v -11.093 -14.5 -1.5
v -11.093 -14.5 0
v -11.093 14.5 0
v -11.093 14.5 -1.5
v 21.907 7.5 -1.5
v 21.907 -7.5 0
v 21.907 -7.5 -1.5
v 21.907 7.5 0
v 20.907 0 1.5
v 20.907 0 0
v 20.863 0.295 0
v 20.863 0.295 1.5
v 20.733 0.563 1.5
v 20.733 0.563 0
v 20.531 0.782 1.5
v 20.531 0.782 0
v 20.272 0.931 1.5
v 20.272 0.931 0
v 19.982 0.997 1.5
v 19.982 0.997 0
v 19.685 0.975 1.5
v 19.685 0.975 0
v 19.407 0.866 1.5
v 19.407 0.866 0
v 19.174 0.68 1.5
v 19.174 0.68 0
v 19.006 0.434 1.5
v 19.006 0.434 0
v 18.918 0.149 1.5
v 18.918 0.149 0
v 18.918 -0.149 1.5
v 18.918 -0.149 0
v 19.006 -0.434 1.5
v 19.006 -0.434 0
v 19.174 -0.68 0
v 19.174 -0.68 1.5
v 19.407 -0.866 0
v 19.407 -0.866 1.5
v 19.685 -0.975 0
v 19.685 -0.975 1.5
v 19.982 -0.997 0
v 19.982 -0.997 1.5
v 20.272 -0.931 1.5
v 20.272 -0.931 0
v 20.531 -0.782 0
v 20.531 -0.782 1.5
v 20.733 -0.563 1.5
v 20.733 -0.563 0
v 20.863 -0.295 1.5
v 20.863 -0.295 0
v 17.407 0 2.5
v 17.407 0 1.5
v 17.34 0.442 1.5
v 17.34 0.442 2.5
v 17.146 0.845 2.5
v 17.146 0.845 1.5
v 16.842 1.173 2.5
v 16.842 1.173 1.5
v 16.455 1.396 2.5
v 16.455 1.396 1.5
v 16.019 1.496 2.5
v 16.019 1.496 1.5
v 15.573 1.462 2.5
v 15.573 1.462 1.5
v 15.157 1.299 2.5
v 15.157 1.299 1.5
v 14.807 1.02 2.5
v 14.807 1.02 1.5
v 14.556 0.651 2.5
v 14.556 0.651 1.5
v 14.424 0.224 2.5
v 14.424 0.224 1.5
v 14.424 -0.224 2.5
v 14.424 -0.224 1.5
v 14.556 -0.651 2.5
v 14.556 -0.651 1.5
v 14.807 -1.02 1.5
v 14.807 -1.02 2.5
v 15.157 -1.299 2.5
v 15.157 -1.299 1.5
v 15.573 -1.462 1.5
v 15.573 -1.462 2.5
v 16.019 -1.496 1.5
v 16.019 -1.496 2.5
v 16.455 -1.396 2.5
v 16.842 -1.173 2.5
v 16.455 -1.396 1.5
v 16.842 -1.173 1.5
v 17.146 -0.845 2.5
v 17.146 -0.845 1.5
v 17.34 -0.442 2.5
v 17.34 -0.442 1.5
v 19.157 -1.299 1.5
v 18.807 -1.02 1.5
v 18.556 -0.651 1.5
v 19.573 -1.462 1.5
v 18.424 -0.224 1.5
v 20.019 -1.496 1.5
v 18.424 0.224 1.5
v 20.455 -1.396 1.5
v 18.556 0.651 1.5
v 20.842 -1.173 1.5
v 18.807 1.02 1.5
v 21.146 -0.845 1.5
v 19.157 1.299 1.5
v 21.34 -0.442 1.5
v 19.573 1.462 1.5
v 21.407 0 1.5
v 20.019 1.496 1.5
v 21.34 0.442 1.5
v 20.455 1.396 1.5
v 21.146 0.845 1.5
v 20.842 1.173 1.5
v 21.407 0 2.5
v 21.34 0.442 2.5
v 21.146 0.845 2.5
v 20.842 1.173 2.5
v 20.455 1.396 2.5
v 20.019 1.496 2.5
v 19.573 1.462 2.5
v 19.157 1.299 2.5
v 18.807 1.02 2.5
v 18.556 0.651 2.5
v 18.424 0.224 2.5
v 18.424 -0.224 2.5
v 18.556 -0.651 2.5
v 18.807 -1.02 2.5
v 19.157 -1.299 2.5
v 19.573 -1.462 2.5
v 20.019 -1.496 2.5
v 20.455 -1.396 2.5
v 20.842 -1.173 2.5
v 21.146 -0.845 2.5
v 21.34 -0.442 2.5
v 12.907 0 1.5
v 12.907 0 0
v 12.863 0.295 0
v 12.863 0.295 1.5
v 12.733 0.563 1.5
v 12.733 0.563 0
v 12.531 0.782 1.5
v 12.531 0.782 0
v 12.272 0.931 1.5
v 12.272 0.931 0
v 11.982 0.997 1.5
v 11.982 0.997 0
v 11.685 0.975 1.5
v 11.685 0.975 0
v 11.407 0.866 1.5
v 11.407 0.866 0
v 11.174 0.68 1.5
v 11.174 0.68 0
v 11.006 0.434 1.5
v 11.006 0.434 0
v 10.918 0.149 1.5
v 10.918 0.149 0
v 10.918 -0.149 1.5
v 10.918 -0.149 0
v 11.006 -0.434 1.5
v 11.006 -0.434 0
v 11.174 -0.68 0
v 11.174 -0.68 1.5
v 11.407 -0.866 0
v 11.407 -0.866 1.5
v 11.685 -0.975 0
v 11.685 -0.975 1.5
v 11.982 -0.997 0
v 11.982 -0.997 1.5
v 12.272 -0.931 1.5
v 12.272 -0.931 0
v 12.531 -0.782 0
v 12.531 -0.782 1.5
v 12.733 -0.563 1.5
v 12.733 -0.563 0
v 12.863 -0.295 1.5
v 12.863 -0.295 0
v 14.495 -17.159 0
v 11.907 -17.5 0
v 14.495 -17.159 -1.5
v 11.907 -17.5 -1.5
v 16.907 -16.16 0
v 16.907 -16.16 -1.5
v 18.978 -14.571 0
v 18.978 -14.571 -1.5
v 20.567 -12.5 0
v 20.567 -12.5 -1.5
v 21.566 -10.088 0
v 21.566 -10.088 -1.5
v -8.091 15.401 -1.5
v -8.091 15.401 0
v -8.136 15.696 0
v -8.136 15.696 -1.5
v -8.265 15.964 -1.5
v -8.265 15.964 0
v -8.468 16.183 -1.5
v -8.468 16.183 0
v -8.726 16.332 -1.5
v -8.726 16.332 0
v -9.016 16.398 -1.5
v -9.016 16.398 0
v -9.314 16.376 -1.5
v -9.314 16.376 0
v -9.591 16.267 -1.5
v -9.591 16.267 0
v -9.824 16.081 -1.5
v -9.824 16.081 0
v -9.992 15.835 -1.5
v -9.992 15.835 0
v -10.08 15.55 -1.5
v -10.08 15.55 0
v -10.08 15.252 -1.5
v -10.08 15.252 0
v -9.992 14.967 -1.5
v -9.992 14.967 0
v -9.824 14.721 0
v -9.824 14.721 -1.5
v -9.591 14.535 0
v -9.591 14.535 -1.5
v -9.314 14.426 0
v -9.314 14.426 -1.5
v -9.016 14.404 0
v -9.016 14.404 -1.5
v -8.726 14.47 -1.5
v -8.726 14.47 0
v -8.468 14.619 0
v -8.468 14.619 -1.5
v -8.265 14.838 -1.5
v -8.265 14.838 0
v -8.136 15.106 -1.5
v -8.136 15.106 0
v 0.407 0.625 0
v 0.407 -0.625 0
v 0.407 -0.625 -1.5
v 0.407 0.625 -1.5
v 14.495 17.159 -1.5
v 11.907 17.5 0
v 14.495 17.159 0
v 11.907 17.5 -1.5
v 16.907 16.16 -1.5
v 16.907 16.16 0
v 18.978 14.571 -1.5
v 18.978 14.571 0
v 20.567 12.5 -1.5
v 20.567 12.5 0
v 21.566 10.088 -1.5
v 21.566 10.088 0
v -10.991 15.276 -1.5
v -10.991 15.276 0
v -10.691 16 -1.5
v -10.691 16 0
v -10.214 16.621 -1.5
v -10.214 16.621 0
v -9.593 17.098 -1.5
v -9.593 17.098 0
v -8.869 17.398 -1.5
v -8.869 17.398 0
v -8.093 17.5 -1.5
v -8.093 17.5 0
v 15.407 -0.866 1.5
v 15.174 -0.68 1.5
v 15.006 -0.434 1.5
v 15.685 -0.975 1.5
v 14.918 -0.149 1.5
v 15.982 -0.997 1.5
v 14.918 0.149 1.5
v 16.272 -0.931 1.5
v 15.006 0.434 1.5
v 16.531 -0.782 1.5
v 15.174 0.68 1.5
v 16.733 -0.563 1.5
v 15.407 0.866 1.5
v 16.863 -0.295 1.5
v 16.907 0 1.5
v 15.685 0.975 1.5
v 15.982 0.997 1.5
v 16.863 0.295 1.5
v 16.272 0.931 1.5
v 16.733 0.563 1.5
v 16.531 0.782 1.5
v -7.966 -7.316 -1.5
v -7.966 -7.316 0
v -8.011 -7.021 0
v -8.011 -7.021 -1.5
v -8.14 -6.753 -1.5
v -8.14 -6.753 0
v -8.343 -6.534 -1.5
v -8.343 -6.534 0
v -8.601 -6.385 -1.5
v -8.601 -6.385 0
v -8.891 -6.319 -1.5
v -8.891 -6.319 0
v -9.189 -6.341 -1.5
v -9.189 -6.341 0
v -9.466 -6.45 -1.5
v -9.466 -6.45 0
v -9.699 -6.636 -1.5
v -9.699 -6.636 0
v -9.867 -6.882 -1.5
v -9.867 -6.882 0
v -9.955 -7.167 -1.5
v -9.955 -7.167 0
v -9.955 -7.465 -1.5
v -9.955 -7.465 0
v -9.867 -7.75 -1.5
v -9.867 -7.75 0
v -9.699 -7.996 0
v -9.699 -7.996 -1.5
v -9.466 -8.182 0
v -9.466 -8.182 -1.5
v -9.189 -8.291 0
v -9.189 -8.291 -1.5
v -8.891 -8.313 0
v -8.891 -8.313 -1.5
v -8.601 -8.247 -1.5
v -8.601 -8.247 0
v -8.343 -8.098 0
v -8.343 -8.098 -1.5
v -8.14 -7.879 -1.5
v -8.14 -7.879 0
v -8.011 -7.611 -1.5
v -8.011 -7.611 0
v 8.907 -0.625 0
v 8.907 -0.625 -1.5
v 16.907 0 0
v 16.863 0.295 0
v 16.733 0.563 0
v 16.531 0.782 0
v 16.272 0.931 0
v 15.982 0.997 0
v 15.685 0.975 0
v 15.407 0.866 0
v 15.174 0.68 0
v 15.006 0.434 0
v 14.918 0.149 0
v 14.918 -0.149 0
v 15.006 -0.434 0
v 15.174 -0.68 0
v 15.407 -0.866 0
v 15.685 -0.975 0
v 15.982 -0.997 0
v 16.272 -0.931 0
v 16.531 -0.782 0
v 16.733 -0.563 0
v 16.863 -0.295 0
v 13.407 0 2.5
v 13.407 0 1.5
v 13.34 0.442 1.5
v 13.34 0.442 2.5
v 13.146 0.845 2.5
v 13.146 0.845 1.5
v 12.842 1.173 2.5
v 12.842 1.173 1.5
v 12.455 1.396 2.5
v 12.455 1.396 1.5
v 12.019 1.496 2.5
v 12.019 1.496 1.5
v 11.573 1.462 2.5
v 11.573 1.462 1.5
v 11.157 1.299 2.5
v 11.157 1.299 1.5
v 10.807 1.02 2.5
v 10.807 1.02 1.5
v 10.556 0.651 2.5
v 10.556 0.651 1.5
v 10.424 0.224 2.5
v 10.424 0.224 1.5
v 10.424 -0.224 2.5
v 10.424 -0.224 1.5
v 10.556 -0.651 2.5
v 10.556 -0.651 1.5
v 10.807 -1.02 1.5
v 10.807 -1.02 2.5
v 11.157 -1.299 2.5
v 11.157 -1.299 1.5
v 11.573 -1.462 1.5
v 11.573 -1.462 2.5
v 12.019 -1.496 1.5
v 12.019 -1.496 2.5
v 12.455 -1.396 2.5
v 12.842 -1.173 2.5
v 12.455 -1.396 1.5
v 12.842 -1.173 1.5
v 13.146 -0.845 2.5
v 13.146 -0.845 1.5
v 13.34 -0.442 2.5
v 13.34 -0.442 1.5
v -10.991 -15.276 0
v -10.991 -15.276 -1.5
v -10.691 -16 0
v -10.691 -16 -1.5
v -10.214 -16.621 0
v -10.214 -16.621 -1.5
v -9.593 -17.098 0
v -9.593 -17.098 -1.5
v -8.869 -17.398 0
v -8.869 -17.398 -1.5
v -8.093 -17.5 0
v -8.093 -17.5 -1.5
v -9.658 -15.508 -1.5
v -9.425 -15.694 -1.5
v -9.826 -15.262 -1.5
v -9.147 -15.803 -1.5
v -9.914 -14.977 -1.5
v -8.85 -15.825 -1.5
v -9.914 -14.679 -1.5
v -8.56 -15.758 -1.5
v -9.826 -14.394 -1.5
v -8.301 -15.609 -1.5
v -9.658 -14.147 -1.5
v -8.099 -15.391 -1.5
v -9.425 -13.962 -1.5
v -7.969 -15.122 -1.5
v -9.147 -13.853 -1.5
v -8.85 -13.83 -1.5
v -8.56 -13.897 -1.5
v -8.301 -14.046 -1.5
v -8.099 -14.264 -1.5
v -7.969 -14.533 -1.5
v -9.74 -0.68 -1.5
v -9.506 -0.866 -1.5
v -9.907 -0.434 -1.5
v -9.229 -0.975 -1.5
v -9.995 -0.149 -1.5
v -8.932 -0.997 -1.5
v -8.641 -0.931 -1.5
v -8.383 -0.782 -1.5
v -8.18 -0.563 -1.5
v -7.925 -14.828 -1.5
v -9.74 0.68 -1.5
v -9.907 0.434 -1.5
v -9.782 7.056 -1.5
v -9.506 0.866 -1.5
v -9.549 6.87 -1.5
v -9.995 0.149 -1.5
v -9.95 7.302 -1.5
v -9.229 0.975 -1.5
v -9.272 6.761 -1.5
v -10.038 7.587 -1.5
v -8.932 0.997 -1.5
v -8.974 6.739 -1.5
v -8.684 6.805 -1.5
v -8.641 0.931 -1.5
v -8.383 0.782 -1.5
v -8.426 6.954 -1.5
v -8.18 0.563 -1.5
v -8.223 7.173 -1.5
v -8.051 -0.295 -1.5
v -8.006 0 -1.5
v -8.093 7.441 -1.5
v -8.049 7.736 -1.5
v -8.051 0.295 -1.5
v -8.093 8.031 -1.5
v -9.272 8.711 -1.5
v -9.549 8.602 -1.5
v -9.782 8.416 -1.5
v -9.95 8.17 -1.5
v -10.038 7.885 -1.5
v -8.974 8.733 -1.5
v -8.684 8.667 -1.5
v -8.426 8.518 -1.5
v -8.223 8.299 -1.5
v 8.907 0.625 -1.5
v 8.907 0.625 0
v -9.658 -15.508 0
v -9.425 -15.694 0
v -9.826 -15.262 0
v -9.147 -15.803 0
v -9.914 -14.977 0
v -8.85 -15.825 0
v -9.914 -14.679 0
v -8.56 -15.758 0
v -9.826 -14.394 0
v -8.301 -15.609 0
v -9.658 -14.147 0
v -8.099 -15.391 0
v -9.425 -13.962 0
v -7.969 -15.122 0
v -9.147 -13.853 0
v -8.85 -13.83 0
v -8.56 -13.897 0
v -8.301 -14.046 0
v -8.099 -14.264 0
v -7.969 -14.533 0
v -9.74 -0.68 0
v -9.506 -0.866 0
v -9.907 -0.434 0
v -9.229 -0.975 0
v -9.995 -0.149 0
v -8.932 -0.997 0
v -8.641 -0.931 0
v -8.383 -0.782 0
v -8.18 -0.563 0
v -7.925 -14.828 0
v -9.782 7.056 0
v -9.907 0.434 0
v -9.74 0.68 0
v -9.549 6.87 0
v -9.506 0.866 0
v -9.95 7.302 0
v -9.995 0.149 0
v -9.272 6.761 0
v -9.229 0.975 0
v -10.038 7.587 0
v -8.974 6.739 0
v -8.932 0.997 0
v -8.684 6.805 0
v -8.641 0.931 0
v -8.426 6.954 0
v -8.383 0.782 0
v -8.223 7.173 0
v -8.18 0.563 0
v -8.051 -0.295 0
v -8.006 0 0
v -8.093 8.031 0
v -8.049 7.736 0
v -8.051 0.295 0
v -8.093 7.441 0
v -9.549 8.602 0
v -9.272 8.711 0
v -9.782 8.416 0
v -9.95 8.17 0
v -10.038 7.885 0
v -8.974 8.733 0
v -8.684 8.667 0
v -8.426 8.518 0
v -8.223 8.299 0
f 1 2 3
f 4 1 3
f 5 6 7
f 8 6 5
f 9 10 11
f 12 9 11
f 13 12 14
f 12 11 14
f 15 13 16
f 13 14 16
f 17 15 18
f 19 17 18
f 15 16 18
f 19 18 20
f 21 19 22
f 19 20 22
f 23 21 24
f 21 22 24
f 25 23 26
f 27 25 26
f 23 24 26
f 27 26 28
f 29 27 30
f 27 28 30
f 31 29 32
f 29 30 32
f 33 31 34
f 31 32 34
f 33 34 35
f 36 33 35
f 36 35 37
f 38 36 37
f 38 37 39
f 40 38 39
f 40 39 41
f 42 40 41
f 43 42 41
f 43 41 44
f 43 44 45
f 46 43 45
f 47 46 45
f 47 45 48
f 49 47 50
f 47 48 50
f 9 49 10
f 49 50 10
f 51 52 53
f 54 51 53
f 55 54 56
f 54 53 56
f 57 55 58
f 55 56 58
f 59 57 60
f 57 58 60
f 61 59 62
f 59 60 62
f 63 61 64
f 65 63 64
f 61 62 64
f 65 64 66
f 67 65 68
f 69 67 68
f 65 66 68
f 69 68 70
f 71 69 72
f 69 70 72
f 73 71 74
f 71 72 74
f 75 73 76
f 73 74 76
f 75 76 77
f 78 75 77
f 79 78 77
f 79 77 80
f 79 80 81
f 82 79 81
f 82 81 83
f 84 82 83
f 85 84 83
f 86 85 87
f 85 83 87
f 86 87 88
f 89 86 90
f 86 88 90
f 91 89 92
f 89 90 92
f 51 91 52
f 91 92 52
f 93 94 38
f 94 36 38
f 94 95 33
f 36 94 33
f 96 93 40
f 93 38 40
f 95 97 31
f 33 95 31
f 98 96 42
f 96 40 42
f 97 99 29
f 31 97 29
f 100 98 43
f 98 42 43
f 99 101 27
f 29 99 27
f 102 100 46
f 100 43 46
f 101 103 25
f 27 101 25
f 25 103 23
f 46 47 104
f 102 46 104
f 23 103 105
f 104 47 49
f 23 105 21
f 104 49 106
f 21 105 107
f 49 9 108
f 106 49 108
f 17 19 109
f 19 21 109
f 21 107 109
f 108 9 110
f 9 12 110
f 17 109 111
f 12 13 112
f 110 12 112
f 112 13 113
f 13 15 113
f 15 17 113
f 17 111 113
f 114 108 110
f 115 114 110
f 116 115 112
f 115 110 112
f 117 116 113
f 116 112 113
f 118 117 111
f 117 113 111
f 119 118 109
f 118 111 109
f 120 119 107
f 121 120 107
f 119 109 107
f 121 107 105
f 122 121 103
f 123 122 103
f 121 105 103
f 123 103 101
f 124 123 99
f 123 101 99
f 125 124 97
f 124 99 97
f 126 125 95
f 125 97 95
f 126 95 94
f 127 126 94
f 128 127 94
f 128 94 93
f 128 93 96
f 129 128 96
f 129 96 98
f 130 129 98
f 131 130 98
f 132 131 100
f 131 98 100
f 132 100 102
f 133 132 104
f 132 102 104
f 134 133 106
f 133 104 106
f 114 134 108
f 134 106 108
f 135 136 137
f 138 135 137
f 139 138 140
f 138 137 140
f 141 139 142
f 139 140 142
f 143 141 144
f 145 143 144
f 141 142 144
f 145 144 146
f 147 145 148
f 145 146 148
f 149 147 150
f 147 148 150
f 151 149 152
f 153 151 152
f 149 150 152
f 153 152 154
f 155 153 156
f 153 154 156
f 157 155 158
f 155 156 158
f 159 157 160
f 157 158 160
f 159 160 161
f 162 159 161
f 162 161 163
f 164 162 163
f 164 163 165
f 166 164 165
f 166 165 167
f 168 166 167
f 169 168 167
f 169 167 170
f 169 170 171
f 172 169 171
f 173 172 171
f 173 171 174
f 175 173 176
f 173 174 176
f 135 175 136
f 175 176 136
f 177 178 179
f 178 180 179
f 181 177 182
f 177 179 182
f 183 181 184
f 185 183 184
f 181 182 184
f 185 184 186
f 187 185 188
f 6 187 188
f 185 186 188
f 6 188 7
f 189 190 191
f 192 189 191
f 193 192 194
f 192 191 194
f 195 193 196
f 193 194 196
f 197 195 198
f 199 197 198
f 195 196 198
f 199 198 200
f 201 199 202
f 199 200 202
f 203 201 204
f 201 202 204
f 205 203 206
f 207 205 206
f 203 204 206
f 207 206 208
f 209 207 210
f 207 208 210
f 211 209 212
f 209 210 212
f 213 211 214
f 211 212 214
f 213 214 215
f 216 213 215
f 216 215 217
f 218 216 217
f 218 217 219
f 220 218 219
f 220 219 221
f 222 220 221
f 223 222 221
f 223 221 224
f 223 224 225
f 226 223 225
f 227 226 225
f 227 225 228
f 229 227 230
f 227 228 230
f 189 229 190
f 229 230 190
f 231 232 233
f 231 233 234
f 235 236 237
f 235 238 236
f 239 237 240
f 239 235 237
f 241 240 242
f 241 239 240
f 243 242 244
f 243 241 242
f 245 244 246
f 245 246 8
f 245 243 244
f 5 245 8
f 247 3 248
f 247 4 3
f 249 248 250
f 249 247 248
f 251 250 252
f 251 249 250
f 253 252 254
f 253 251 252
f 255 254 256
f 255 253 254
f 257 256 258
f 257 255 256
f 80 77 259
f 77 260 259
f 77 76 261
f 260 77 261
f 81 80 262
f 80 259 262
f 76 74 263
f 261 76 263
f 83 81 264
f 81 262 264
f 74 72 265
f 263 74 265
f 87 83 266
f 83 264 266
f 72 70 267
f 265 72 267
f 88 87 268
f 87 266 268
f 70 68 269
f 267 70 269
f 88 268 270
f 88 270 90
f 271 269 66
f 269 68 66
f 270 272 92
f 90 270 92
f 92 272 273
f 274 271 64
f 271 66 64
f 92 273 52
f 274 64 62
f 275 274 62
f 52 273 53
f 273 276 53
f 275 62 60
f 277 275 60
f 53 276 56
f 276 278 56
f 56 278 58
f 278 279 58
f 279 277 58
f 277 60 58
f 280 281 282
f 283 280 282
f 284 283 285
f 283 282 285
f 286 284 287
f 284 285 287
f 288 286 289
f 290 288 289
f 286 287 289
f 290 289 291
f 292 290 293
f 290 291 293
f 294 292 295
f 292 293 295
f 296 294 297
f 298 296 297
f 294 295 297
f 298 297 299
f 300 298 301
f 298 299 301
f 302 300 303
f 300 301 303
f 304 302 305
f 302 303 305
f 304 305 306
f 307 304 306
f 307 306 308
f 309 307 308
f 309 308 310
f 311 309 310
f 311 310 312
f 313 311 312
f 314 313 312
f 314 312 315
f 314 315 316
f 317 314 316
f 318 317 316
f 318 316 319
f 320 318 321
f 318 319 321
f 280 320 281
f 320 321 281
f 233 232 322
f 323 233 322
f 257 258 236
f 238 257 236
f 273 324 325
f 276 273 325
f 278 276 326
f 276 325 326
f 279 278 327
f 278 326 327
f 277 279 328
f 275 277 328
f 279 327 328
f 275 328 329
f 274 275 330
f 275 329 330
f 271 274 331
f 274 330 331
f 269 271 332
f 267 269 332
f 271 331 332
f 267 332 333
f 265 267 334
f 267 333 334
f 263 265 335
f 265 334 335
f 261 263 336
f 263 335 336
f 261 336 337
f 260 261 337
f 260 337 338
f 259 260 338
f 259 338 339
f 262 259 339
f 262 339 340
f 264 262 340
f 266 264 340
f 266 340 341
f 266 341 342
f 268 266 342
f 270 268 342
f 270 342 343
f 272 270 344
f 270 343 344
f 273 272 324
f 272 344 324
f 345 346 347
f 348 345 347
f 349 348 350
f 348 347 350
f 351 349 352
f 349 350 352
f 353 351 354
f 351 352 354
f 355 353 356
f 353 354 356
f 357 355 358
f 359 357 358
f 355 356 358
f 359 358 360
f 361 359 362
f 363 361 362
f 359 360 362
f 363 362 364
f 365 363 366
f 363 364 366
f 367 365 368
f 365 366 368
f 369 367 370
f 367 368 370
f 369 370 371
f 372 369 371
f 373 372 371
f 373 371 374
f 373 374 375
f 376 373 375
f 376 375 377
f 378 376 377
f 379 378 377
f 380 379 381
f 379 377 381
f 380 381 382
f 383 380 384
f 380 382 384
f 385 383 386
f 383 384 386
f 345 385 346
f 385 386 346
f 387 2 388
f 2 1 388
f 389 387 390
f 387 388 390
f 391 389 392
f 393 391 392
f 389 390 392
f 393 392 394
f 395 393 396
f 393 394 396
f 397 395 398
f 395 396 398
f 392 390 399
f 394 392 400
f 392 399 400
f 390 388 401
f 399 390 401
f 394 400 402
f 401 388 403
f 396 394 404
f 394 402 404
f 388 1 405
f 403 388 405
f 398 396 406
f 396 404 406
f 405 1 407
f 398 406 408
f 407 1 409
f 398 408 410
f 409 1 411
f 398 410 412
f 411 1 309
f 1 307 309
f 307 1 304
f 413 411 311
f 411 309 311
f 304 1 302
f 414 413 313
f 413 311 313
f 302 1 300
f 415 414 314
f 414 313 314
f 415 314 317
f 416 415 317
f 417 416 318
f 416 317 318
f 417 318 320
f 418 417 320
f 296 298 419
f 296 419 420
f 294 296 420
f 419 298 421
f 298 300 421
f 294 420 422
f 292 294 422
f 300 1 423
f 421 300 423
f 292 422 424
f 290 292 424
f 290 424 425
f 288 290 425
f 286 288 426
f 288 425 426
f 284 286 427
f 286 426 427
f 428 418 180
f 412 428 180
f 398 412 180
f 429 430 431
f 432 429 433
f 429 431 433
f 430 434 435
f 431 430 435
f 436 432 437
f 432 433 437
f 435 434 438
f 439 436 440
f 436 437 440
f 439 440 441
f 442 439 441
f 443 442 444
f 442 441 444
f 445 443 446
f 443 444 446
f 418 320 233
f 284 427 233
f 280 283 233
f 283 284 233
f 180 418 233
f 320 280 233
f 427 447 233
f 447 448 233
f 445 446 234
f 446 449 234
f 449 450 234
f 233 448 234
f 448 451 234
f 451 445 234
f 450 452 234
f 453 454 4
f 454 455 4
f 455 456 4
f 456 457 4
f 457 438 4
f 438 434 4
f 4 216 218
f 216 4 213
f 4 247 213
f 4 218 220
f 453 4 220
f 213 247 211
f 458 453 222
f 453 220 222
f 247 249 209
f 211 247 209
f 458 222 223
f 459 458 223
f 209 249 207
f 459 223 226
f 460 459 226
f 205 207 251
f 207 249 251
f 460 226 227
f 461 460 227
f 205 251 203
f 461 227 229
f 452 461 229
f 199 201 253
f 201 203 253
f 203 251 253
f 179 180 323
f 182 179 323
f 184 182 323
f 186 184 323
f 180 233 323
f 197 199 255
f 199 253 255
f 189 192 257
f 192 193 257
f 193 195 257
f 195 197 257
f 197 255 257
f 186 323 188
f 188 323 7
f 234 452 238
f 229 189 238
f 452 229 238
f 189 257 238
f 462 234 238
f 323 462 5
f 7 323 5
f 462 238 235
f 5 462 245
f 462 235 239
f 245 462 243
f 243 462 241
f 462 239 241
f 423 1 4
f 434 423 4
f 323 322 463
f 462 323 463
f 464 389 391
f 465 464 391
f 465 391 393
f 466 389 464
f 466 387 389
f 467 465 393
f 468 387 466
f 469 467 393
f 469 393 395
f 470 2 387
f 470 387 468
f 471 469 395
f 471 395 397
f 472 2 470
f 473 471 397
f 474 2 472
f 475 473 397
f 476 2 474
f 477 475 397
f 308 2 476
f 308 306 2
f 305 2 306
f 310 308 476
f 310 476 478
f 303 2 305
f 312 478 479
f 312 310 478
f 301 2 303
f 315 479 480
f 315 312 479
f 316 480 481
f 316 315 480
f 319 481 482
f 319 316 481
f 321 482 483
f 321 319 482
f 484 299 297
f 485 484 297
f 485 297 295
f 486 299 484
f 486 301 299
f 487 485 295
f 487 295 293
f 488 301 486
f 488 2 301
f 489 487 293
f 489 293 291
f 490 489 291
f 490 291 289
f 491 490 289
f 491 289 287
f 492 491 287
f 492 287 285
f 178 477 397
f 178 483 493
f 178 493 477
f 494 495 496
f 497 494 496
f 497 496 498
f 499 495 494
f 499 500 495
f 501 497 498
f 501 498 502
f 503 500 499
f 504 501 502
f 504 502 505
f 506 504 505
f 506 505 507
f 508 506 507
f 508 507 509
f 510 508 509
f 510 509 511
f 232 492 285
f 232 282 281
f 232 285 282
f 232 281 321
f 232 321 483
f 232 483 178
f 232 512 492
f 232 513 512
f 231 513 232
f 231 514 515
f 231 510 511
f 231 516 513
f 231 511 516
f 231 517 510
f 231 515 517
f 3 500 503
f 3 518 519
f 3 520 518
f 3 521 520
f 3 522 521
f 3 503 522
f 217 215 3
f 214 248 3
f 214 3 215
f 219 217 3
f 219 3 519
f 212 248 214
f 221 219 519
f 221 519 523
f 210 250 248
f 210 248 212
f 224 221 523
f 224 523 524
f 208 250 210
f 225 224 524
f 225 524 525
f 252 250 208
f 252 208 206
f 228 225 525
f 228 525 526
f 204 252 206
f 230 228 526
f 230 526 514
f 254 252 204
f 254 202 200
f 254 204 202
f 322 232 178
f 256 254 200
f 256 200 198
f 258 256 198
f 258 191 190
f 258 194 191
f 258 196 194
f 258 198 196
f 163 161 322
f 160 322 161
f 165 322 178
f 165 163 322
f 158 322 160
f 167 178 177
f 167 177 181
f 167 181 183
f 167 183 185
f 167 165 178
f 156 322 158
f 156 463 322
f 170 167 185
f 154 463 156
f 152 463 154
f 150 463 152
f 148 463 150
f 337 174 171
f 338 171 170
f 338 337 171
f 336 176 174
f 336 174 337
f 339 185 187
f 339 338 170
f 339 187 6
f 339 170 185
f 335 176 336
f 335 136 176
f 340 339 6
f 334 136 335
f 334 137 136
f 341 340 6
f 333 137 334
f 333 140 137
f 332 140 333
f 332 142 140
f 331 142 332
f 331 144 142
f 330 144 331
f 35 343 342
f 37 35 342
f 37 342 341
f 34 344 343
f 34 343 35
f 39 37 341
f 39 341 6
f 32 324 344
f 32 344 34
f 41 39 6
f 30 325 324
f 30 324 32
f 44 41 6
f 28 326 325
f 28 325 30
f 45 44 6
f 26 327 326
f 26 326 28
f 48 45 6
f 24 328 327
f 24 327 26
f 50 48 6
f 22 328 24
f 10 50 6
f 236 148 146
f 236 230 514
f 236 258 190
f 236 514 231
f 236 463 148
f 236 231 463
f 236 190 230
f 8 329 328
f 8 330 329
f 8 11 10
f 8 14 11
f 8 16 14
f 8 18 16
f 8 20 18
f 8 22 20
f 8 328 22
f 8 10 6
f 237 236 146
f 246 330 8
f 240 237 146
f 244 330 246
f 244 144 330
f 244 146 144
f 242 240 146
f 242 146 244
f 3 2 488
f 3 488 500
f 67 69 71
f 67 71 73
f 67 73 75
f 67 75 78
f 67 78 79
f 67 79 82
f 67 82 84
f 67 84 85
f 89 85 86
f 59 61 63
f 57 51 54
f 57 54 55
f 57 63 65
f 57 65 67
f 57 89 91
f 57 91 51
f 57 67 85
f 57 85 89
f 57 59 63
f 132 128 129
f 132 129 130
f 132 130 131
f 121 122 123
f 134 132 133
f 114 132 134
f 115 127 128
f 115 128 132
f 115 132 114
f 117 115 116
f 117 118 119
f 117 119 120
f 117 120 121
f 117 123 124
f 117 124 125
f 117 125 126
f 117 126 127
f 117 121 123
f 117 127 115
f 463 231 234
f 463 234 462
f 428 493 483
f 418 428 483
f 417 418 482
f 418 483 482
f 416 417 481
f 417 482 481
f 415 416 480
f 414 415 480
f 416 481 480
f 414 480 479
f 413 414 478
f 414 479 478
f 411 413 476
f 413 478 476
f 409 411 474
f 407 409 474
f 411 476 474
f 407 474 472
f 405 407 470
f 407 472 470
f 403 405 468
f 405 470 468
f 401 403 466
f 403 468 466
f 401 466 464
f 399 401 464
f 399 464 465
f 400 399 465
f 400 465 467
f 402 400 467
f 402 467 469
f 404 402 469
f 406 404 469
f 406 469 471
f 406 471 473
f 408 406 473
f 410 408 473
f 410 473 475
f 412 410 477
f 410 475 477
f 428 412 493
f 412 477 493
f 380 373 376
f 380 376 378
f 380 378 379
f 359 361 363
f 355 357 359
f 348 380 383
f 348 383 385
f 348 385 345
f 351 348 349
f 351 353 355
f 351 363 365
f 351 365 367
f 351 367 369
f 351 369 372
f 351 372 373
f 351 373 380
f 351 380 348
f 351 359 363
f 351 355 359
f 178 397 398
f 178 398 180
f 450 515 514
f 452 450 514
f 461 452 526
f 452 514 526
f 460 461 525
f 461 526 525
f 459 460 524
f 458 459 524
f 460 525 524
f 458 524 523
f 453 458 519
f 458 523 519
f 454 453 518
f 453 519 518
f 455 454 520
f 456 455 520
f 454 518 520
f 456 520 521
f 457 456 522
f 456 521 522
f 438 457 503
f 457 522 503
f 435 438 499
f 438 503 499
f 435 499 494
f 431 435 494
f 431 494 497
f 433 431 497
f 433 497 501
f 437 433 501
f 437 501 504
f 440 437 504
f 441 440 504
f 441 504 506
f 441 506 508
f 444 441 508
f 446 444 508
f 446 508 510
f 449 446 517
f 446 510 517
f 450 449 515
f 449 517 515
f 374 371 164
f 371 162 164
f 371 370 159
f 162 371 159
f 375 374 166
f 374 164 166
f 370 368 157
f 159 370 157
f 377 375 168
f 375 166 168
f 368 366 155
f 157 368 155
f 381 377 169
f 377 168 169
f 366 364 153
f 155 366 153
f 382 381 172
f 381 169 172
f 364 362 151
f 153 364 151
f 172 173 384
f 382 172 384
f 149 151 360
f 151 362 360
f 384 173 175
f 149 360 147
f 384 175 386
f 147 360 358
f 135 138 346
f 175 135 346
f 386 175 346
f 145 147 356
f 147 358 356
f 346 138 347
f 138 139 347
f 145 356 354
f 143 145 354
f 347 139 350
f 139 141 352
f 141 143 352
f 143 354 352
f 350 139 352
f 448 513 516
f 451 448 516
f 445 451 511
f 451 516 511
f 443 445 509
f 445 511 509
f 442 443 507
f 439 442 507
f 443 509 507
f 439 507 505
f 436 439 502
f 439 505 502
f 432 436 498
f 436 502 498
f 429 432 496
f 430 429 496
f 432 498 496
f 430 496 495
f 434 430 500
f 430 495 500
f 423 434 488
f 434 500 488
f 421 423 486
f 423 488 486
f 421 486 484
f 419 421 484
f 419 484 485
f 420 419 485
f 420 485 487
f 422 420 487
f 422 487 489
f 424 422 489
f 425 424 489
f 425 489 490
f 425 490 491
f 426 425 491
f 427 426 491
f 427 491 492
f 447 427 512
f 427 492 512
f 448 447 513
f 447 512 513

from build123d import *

# Parameters (mm, degrees)
F0_W      = 33
F0_H      = 35
F0_W_2    = 8.5
F0_H_2    = 1.25
F1_DEPTH  = 1.5
F2_R      = 1
F3_DEPTH  = 1.5
F4_R      = 3
F5_R      = 10
F6_R      = 1
F7_DEPTH  = 1.5
F8_R      = 1.5
F8_R_2    = 1
F9_DEPTH  = 1
F10_R     = 1.5
F10_R_2   = 1
F11_DEPTH = 1
F12_R     = 1.5
F12_R_2   = 1
F13_DEPTH = 1


with BuildPart() as f1:
    # F0 (on Top) → F1 (new body)
    with BuildSketch(Plane.XY):
        with Locations((5.4070419595, 0)):
            Rectangle(F0_W, F0_H)
        with Locations((4.6570419595, 0)):
            Rectangle(F0_W_2, F0_H_2, mode=Mode.SUBTRACT)
    extrude(amount=-F1_DEPTH)

    # F2 (on face) → F3 (cut)
    with BuildSketch(Plane.XY):
        with Locations((-9.0911619139, 15.4008569585)):
            Circle(F2_R)
        with Locations((-9.0490024113, 7.7360985084)):
            Circle(F2_R)
        with Locations((-9.0064505073, 0)):
            Circle(F2_R)
        with Locations((-8.9662096661, -7.3159384689)):
            Circle(F2_R)
        with Locations((-8.9248921722, -14.8276165128)):
            Circle(F2_R)
    extrude(amount=-F3_DEPTH, mode=Mode.SUBTRACT)

    # F4
    f4_edges = [f1.edges().sort_by_distance(p)[0] for p in [
        (-11.092958, -17.5, -0.75),
        (-11.092958, 17.5, -0.75),
    ]]
    fillet(f4_edges, radius=F4_R)

    # F5
    f5_edges = [f1.edges().sort_by_distance(p)[0] for p in [
        (21.907042, 17.5, -0.75),
        (21.907042, -17.5, -0.75),
    ]]
    fillet(f5_edges, radius=F5_R)

    # F6 (on face) → F7 (join)
    with BuildSketch(Plane.XY):
        with Locations((11.9070419595, 0)):
            Circle(F6_R)
        with Locations((15.9070419595, 0)):
            Circle(F6_R)
        with Locations((19.9070419595, 0)):
            Circle(F6_R)
    extrude(amount=F7_DEPTH)

    # F8 (on face) → F9 (join)
    with BuildSketch(Plane.XY.offset(1.5)):
        with Locations((11.9070419595, 0)):
            Circle(F8_R)
        with Locations((11.9070419595, 0)):
            Circle(F8_R_2, mode=Mode.SUBTRACT)
        with Locations((11.9070419595, 0)):
            Circle(F8_R_2)
    extrude(amount=F9_DEPTH)

    # F10 (on face) → F11 (join)
    with BuildSketch(Plane.XY.offset(1.5)):
        with Locations((15.9070419595, 0)):
            Circle(F10_R)
        with Locations((15.9070419595, 0)):
            Circle(F10_R_2, mode=Mode.SUBTRACT)
        with Locations((15.9070419595, 0)):
            Circle(F10_R_2)
    extrude(amount=F11_DEPTH)

    # F12 (on face) → F13 (join)
    with BuildSketch(Plane.XY.offset(1.5)):
        with Locations((19.9070419595, 0)):
            Circle(F12_R)
        with Locations((19.9070419595, 0)):
            Circle(F12_R_2, mode=Mode.SUBTRACT)
        with Locations((19.9070419595, 0)):
            Circle(F12_R_2)
    extrude(amount=F13_DEPTH)


solid = f1.part
